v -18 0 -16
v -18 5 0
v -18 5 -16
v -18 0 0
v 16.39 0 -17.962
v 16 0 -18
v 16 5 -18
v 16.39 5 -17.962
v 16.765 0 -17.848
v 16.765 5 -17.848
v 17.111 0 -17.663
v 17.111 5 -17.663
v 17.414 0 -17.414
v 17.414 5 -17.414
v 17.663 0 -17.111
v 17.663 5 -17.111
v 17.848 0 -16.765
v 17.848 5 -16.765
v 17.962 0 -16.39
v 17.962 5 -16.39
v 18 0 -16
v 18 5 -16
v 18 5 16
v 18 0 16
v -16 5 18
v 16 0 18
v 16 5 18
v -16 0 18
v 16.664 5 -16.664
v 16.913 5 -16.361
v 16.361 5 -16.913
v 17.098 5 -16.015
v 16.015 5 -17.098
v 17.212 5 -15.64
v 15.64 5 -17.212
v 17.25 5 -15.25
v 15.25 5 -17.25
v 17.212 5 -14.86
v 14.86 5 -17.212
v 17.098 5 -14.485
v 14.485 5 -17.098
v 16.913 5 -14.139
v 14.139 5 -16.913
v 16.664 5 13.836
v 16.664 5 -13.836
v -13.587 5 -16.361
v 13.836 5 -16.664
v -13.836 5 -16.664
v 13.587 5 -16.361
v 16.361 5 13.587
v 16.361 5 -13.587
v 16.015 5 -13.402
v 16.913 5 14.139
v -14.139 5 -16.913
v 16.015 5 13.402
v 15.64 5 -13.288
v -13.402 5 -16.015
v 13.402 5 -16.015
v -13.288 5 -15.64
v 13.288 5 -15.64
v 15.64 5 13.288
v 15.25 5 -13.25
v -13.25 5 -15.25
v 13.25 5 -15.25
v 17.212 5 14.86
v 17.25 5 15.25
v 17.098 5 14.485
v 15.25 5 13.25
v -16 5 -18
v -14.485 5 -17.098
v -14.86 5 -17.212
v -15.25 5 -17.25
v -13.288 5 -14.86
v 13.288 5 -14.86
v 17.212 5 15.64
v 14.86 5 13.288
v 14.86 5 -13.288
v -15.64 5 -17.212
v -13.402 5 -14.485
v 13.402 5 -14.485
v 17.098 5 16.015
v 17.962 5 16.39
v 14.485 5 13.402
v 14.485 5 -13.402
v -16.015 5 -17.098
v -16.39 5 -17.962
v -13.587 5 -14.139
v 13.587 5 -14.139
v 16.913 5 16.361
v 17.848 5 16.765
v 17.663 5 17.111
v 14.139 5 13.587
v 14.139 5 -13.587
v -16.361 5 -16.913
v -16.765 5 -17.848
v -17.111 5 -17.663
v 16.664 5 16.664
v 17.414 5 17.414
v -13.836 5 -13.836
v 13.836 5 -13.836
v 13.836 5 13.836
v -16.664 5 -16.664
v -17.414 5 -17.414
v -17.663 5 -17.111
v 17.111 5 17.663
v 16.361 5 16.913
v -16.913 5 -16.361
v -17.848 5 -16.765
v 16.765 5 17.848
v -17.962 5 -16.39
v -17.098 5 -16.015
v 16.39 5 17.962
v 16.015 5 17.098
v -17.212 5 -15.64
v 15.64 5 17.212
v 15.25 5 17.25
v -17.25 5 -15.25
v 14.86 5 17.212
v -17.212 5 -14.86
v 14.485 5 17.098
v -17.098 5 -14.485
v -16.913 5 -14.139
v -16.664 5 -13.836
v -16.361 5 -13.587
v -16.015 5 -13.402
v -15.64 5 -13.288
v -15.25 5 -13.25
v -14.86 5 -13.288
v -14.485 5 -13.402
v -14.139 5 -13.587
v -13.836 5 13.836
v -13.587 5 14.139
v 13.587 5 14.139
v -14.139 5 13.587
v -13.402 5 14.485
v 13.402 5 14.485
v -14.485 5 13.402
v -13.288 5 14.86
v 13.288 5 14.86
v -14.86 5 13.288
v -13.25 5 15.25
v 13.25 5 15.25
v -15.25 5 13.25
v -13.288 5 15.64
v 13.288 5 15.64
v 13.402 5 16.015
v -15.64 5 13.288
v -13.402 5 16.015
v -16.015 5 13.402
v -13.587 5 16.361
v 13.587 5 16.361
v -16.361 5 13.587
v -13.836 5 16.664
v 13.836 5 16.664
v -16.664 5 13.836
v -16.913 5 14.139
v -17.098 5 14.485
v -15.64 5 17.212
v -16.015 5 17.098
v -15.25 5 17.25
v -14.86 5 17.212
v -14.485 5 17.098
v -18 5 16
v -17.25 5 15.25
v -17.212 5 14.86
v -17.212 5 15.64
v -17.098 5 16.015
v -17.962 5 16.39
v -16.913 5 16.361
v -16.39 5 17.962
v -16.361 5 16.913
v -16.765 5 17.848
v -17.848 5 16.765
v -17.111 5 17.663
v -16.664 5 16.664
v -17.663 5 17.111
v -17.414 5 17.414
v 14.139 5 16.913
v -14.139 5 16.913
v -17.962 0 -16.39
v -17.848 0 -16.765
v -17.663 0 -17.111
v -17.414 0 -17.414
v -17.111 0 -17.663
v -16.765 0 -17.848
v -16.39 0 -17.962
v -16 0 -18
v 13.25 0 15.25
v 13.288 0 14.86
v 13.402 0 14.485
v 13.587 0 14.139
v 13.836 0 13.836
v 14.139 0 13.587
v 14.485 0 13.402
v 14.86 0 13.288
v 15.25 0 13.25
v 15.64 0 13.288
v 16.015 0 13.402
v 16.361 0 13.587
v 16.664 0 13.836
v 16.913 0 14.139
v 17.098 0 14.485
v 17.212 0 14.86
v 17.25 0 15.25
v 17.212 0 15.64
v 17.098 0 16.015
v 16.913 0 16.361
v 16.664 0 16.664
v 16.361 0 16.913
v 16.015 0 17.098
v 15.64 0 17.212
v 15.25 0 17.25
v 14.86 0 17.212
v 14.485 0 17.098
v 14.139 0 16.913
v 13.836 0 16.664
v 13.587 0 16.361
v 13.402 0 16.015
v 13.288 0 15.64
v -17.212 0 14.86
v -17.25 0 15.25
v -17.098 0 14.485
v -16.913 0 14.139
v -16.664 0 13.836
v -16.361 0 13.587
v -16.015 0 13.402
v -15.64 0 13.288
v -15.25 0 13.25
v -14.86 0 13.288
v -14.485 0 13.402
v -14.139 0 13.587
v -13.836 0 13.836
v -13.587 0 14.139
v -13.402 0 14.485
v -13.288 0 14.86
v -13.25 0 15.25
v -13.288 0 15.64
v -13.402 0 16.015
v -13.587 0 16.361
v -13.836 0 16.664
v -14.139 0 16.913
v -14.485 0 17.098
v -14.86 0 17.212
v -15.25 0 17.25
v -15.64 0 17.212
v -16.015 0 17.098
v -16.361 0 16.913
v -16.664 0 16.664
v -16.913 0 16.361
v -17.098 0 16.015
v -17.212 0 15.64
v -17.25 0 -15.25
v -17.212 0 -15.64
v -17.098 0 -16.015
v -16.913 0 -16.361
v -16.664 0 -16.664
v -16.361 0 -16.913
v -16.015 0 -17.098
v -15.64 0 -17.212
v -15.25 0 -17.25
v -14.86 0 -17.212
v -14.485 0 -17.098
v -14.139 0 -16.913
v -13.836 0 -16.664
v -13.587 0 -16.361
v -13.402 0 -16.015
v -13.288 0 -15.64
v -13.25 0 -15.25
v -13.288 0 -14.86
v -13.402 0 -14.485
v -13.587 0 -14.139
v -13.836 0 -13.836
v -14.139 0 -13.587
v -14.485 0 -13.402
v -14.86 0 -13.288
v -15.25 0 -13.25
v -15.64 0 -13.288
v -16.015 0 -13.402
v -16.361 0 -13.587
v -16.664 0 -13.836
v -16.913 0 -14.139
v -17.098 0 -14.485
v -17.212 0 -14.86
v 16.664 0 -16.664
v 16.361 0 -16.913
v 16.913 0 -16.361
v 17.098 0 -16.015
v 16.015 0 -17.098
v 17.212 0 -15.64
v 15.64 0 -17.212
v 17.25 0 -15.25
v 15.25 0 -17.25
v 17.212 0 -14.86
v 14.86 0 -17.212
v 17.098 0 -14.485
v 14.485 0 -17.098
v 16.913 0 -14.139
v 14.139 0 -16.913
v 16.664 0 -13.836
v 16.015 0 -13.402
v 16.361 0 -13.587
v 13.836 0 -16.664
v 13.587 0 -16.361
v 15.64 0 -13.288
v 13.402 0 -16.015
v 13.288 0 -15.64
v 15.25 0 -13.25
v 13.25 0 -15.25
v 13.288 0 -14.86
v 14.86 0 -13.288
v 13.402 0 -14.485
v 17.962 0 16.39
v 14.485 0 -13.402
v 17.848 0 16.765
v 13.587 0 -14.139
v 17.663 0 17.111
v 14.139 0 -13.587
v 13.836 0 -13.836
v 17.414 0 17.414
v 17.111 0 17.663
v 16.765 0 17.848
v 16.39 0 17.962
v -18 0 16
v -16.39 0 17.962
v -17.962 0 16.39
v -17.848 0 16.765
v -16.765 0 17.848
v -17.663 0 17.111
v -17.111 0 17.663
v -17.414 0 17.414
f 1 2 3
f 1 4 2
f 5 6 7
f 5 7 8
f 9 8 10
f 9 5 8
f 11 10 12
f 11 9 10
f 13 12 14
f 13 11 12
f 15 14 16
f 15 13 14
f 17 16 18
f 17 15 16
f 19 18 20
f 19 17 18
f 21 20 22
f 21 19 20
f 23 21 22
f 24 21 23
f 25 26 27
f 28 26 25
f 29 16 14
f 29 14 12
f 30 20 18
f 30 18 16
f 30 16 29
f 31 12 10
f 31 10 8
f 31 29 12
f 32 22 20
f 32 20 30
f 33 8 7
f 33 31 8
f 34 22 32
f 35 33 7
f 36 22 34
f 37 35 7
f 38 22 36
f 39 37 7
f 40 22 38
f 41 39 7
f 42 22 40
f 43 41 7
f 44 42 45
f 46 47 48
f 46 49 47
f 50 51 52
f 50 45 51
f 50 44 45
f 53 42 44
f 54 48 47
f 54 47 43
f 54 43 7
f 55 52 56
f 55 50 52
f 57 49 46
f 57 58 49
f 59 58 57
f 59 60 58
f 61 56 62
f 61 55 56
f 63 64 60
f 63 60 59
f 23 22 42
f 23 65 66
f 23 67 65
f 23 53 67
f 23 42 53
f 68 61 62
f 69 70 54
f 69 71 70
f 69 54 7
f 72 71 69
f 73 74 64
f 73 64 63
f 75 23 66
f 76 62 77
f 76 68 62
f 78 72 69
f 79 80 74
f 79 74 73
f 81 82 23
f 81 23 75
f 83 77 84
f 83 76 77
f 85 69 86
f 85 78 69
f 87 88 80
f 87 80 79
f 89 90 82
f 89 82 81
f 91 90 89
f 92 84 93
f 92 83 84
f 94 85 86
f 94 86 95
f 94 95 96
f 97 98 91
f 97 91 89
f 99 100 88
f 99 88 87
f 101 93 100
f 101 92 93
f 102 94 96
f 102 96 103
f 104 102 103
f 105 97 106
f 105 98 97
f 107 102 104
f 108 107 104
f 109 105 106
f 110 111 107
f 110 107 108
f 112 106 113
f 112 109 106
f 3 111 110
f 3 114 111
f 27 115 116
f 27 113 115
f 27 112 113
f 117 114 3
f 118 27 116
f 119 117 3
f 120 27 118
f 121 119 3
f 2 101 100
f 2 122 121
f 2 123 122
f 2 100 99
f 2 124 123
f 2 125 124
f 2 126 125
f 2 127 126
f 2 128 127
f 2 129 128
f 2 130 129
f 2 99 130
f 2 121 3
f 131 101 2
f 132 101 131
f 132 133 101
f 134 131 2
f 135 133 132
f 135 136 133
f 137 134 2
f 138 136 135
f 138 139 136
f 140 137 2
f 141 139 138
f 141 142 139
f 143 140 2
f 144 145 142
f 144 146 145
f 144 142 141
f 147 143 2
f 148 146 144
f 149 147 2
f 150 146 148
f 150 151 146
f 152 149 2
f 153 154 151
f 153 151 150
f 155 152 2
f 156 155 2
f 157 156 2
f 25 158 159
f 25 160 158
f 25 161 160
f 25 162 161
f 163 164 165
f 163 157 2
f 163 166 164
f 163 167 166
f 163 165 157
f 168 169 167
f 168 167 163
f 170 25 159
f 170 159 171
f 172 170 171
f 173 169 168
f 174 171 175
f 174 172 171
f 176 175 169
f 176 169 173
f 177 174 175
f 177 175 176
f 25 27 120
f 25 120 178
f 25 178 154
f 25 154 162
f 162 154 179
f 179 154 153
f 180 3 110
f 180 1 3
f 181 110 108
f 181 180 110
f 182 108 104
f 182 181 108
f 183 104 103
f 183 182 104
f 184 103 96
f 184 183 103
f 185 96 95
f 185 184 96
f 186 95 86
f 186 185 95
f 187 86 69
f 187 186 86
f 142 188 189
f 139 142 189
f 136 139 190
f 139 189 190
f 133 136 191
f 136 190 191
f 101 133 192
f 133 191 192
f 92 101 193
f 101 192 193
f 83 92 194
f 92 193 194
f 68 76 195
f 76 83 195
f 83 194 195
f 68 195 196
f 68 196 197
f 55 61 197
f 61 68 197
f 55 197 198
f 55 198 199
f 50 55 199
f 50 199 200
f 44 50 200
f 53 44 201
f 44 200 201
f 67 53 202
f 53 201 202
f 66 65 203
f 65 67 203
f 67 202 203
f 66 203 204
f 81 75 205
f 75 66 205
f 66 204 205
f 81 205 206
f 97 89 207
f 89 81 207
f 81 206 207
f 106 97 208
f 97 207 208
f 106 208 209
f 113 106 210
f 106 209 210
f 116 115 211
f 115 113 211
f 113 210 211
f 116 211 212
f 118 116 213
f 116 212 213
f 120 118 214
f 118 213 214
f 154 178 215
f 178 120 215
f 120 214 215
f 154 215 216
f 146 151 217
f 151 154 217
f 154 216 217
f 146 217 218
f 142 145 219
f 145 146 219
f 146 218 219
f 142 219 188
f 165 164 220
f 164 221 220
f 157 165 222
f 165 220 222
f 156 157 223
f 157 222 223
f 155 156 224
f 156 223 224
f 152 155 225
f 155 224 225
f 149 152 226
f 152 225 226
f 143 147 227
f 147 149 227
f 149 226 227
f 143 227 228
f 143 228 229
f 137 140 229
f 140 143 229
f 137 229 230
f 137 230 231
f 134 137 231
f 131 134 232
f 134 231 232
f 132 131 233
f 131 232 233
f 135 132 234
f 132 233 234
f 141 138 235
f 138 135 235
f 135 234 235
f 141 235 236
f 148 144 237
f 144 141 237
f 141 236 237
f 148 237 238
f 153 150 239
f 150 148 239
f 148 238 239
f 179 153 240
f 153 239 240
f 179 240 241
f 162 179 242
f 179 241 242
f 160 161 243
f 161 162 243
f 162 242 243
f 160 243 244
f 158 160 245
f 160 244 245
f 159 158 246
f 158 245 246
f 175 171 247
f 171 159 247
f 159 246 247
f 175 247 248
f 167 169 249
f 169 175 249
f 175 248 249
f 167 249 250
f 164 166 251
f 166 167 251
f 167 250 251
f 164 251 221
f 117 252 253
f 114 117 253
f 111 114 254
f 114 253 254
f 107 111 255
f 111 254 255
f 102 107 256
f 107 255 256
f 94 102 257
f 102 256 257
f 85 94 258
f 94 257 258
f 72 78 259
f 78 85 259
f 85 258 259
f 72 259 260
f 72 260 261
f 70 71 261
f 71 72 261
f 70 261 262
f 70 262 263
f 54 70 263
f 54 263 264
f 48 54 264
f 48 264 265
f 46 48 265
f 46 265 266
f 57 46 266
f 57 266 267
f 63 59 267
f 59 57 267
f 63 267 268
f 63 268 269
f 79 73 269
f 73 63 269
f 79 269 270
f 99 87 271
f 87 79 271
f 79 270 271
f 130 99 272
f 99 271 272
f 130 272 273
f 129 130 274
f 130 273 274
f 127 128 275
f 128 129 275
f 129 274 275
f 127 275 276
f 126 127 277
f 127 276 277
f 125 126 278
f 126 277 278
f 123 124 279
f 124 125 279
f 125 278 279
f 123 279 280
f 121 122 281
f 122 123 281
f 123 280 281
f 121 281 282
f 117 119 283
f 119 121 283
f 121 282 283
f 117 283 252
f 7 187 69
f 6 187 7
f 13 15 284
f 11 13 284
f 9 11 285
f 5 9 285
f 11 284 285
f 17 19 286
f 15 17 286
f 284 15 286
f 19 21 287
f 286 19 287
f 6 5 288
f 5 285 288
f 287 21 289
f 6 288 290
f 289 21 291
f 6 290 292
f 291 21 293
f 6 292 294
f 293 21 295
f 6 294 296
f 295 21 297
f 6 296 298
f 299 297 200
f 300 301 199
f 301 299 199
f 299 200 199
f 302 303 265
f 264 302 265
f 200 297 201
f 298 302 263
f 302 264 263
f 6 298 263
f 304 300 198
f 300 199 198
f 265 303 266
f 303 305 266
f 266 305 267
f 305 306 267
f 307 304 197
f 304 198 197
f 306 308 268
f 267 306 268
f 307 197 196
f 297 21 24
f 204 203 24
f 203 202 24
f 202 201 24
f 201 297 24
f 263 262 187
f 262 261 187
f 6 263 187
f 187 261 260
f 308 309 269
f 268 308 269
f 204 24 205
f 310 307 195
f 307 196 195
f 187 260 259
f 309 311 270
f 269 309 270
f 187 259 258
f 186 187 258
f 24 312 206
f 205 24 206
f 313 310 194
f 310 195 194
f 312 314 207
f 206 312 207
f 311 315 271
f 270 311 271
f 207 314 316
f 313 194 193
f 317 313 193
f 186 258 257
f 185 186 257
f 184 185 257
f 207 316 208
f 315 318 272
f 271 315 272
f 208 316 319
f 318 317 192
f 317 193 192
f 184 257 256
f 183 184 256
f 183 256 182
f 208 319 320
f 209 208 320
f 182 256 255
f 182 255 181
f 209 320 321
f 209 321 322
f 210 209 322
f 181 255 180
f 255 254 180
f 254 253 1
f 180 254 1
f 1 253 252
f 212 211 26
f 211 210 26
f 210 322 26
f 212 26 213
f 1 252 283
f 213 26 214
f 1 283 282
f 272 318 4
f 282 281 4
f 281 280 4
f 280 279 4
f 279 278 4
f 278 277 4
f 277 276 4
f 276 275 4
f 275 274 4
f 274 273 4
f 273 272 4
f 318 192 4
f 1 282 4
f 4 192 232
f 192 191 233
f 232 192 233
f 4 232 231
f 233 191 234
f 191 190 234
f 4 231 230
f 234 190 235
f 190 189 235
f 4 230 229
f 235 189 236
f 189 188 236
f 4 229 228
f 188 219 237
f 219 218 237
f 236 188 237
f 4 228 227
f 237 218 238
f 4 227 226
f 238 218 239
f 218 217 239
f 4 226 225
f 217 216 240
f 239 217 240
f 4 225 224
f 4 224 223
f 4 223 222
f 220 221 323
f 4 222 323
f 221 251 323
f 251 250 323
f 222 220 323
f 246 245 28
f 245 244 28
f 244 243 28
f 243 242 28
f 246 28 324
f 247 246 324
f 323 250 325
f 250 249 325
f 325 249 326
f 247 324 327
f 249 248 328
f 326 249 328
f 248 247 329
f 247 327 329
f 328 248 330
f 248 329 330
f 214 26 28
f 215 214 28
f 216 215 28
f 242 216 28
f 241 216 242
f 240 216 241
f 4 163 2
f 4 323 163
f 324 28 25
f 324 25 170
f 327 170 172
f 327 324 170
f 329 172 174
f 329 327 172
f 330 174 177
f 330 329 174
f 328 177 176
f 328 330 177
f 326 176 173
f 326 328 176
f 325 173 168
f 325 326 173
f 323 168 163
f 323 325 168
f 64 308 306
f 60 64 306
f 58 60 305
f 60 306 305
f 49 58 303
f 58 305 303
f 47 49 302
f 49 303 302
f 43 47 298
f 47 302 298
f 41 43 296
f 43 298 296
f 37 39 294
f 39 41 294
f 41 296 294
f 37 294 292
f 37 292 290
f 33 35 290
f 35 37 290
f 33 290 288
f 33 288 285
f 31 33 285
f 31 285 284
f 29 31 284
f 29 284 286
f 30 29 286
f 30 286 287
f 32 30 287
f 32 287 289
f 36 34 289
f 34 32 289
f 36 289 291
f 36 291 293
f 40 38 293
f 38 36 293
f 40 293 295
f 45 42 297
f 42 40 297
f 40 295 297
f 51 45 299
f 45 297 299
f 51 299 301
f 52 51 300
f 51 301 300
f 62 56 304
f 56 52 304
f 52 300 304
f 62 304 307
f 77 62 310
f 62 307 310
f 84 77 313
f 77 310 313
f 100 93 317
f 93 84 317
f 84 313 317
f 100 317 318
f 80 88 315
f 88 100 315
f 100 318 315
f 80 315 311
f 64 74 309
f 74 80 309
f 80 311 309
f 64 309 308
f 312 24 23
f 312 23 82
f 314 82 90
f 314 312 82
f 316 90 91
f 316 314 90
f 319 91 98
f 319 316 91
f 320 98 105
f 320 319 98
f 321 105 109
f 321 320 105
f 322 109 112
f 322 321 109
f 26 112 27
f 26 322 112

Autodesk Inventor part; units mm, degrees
ref_plane "YZ Plane" through (0, 0, 0) normal (1, 0, 0) x (0, 1, 0)
ref_plane "XZ Plane" through (0, 0, 0) normal (0, 1, 0) x (-1, 0, 0)
ref_plane "XY Plane" through (0, 0, 0) normal (0, 0, 1) x (1, 0, 0)
sketch "Sketch1" plane through (0, 0, 0) normal (0, 1, 0) x (-1, 0, 0)
  line L0 (0, 0) -> (18, 0)
  line L1 (16, -18) -> (-16, -18)
  line L2 (-18, -16) -> (-18, 16)
  line L3 (-16, 18) -> (16, 18)
  line L4 (18, 16) -> (18, -16)
  circle A0 centre (15.25, 15.25) radius 2
  circle A1 centre (-15.25, 15.25) radius 2
  circle A2 centre (-15.25, -15.25) radius 2
  circle A3 centre (15.25, -15.25) radius 2
  arc A4 (16, -18) -> (18, -16) centre (16, -16) ccw
  arc A5 (18, 16) -> (16, 18) centre (16, 16) ccw
  arc A6 (-16, 18) -> (-18, 16) centre (-16, 16) ccw
  arc A7 (-18, -16) -> (-16, -18) centre (-16, -16) ccw
  point P0 (18, -18)
  point P1 (-18, 18)
  point P2 (-18, -18)
  point P3 (18, 18)
  dimension "d0" = 18
  dimension "d1" = 18
  dimension "d2" = 36
  dimension "d3" = 36
  dimension "d6" = 30.5
  dimension "d7" = 30.5
  dimension "d8" = 15.25
  dimension "d9" = 2.75
  dimension "d10" = 4
  dimension "d11" = 4
  dimension "d12" = 4
  dimension "d13" = 4
  dimension "d14" = 2
  dimension "d15" = 2
extrude "Extrusion2" add sketch "Sketch1" along normal blind 5
properties part number "Flight_controler"
